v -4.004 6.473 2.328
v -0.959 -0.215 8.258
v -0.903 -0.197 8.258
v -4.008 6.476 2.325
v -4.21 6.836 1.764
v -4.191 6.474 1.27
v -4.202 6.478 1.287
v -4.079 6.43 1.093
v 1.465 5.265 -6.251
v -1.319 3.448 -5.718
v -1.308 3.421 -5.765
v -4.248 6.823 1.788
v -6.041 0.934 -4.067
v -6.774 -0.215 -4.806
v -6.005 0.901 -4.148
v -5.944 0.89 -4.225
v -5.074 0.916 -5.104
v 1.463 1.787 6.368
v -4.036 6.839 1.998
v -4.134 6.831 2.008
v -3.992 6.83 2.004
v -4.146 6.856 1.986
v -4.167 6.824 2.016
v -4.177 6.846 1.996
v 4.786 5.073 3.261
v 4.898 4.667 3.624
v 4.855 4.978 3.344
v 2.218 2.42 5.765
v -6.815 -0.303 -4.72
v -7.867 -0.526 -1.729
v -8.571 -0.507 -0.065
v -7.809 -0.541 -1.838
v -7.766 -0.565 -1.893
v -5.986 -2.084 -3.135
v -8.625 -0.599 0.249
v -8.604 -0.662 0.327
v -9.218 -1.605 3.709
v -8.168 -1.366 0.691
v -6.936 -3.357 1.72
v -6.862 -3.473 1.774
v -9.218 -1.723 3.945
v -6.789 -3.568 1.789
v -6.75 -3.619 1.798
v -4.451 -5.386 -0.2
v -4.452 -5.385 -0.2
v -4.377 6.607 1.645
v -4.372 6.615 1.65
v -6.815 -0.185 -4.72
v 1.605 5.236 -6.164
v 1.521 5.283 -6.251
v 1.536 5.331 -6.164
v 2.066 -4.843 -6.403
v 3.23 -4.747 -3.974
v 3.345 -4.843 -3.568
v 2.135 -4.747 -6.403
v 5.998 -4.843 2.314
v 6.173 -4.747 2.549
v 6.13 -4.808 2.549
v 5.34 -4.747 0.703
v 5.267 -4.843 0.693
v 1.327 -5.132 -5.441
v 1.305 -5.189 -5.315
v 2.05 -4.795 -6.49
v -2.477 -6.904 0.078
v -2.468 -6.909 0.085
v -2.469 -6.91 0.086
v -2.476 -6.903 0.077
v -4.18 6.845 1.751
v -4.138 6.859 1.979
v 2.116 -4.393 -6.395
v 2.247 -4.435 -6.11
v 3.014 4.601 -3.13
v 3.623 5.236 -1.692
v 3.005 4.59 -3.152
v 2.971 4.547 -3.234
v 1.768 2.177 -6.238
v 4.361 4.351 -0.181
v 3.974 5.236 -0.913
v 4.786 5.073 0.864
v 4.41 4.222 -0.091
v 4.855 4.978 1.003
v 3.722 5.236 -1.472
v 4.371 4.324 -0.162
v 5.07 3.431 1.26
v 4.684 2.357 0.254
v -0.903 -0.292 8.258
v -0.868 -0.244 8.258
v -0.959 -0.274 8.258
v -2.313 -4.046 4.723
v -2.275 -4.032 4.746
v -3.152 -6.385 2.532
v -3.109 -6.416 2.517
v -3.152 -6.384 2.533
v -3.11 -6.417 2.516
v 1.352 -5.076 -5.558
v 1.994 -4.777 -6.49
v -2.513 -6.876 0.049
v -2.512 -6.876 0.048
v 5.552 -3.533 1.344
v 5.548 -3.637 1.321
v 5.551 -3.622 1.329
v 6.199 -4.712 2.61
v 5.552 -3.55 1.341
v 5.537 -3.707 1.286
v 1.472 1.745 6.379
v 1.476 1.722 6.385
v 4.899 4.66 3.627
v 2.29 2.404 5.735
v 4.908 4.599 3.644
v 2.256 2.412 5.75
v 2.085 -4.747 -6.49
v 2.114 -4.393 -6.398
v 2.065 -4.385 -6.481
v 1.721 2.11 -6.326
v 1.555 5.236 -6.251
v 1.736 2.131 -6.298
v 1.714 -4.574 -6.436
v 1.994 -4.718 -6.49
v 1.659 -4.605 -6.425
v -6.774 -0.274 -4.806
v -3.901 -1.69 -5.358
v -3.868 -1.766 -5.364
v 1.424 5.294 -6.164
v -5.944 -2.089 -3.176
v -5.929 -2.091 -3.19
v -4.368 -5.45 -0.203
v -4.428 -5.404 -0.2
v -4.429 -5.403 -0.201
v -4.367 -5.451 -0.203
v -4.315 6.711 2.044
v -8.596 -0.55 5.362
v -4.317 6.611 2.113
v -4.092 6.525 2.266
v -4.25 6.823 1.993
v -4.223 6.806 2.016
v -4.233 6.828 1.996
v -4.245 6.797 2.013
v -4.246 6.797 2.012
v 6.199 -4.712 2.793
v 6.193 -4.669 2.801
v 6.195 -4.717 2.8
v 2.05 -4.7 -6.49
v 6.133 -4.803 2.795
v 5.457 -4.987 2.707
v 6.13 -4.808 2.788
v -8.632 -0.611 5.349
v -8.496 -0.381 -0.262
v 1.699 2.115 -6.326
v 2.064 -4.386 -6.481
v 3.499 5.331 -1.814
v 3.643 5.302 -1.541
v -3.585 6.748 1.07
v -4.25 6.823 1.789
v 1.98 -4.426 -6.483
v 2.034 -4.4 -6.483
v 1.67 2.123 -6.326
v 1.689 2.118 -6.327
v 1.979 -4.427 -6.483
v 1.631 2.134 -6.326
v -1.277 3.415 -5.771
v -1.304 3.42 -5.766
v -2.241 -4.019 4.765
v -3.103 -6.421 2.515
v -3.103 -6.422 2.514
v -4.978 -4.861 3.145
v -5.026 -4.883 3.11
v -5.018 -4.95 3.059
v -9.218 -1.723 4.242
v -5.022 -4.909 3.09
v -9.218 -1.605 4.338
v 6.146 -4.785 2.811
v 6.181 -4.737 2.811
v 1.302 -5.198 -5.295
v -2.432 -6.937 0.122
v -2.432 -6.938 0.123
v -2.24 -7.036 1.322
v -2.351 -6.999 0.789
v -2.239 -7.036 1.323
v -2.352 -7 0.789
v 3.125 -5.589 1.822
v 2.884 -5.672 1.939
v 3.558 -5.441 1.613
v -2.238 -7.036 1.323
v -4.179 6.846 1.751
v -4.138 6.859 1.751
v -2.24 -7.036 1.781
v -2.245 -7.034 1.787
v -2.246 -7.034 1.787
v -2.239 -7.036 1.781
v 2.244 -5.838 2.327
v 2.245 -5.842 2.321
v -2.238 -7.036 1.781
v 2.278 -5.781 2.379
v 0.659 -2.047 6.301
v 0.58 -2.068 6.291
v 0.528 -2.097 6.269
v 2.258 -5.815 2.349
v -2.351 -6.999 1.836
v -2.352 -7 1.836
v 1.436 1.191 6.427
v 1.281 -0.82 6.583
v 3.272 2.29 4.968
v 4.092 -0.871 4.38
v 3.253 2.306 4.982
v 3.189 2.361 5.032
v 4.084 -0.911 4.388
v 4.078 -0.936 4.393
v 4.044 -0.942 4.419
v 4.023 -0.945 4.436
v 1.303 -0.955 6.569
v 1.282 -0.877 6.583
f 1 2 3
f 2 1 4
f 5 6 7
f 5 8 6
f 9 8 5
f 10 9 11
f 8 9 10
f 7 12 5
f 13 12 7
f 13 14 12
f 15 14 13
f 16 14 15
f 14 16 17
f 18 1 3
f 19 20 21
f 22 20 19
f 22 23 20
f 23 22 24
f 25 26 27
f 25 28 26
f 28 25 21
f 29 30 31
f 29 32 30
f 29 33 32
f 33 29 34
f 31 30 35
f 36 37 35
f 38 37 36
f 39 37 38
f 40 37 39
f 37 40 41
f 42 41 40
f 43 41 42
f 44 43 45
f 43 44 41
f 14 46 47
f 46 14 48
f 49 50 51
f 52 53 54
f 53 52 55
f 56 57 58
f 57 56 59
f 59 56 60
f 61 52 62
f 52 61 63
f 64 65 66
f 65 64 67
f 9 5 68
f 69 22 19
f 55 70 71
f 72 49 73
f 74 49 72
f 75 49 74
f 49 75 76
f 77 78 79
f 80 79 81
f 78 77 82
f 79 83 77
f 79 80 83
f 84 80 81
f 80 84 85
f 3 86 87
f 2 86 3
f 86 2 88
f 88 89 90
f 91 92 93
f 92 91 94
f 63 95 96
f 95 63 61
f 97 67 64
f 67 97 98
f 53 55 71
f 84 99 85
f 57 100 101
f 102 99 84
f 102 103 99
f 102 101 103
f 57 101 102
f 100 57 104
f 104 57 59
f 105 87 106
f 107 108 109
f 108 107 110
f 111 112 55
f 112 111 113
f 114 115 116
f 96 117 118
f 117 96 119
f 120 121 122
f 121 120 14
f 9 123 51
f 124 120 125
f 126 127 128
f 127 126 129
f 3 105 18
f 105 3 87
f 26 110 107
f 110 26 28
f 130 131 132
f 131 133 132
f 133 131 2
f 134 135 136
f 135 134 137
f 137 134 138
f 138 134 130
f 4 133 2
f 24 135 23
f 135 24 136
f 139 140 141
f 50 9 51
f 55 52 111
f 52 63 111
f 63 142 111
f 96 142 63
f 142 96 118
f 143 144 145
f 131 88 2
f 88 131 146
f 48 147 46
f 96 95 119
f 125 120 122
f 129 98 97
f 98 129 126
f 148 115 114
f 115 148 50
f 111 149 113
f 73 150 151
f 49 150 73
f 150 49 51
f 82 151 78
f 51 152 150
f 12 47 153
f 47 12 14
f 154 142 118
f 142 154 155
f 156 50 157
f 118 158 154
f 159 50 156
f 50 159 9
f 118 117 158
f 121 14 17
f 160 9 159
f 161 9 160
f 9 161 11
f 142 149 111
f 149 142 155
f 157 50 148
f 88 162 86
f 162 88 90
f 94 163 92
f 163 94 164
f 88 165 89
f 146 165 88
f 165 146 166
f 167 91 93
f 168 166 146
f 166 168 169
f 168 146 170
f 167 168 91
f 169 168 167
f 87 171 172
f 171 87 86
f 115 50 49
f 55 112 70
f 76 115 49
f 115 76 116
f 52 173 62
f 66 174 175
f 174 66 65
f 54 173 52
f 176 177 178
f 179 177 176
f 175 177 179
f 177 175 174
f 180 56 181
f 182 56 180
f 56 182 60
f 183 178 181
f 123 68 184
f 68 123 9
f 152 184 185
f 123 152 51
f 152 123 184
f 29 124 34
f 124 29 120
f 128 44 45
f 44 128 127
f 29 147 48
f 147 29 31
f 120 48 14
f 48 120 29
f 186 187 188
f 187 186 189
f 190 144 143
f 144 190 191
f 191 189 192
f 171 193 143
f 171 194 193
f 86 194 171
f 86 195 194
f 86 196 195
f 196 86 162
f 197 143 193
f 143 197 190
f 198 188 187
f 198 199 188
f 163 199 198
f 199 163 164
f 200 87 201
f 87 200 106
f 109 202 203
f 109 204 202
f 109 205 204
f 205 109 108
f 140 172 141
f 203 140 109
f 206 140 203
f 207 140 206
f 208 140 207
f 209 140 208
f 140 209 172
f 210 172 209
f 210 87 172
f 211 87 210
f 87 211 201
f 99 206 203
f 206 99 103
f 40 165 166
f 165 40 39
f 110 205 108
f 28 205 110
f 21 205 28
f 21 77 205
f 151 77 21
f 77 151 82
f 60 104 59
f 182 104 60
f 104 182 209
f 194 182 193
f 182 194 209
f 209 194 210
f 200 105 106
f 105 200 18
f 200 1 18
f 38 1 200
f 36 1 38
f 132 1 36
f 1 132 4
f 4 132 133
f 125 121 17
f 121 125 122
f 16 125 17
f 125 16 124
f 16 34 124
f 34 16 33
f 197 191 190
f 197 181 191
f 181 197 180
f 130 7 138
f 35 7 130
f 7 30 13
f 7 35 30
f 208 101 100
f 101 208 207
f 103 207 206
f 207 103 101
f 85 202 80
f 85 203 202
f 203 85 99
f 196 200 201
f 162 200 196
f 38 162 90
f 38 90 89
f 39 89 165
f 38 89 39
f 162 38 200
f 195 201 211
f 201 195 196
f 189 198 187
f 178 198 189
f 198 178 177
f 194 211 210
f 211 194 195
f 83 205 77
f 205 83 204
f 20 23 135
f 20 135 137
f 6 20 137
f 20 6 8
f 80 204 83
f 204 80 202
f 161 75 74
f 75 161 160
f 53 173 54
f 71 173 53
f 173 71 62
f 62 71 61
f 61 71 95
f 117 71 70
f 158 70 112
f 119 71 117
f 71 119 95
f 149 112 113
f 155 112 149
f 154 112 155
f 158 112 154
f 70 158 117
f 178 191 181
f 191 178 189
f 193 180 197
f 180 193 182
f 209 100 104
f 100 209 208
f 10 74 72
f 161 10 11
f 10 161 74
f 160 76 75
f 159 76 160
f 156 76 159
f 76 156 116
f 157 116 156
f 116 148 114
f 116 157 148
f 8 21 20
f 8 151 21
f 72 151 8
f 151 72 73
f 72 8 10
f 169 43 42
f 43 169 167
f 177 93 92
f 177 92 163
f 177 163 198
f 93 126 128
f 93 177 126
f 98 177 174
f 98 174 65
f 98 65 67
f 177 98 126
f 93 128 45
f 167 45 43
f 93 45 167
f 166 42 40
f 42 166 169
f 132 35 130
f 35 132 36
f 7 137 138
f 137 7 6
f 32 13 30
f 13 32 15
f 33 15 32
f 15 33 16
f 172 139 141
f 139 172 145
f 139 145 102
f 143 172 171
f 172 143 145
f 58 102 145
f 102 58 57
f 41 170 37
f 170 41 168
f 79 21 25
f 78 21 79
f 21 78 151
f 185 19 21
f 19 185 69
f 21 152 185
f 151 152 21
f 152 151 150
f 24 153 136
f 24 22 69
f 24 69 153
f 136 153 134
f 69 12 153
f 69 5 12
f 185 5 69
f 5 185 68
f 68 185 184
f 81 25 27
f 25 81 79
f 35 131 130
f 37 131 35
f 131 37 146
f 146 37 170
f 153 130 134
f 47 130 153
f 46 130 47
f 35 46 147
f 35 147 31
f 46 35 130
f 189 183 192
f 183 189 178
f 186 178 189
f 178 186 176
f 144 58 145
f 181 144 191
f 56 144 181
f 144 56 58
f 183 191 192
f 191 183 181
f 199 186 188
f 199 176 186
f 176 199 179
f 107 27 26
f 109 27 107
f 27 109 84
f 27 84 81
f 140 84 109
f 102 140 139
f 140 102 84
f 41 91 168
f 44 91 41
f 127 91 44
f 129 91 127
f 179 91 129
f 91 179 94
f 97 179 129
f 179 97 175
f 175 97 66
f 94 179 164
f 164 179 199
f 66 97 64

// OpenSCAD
// Auto-generated OpenSCAD file

    inner_points = 10*[[0.47553456087715823, 0.4978078842969692, -0.2072352496078125], [-0.22709237834801976, -0.6940962000115061, -0.4999467766849563], [-0.36142103174737733, 0.2749515102768153, -0.7070755966518479], [0.6098632142765158, -0.47123982599135217, -0.00010642964092089091], [-0.41688364699083813, 0.6763916464639828, 0.20712881996862775], [-0.9137159203613099, -0.16641181407448244, 0.00015051424090967158], [0.2699180298323196, 0.14875469252611018, 0.7070315120518591], [-0.22691424353815204, -0.694048768012355, 0.500053206324141], [0.4993618307547157, -0.17324932327067738, -0.948257843987832]];

    outer_points = 10*[[-0.42003278146638656, 0.681501101519495, 0.18948721966919727], [-0.3451825718394467, -0.7303265261001592, 0.15572043112390738], [-0.09183323192223902, -0.024412712290332116, 0.8171581072778895], [-0.6733821213835942, -0.024412712290332116, -0.4719504564847848], [0.5617527129175098, 0.5235691569685188, 0.2951032407441999], [0.6146798037179536, -0.47474373238785456, 0.2712265155849332], [0.15053554958787962, 0.5235691569685188, -0.6164341663780378], [0.2034626403883234, -0.47474373238785456, -0.6403108915373046], [-1.0260745241448967, -0.06546983679345328, 0.4628877014666302]];

    // Convex hull for inner set (I)
    module inner_hull() {
        hull() {
            for (p = inner_points) {
                translate(p) sphere(r=0.1);
            }
        }
    }

    // Convex hull for outer set (O) minus inner hull (O \ I)
    module outer_minus_inner() {
        difference() {
            hull() {
                for (p = outer_points) {
                    translate(p) sphere(r=0.1);
                }
            }
            inner_hull(); // Subtract inner hull
        }
    }

    // Convex hull for outer set (O) minus all translated inner hulls
    module outer_minus_AllTranslationInner() {
        difference() {
            hull() {
                for (p = outer_points) {
                    translate(p) sphere(r=0.1);
                }
            }
            hull() {
                translate([0,0,50]) inner_hull();
                translate([0,0,-50]) inner_hull();
            }; // Subtract translated inner hulls
        }
    }

    // Difference between outer_minus_inner and outer_minus_AllTranslationInner
    module outer_minus_inner_diff() {
        difference() {
            // Outer minus inner
            difference() {
                hull() {
                    for (p = outer_points) {
                        translate(p) sphere(r=0.1);
                    }
                }
                inner_hull();
            }

            // Subtract Outer minus AllTranslationInner
            difference() {
                hull() {
                    for (p = outer_points) {
                        translate(p) sphere(r=0.1);
                    }
                }
                hull() {
                    translate([0,0,50]) inner_hull();
                    translate([0,0,-50]) inner_hull();
                };
            }
        }
    }

    // Rendering all with colors applied
    color([1, 1, 0, 1]) outer_minus_inner_diff(); // Opaque yellow
    
